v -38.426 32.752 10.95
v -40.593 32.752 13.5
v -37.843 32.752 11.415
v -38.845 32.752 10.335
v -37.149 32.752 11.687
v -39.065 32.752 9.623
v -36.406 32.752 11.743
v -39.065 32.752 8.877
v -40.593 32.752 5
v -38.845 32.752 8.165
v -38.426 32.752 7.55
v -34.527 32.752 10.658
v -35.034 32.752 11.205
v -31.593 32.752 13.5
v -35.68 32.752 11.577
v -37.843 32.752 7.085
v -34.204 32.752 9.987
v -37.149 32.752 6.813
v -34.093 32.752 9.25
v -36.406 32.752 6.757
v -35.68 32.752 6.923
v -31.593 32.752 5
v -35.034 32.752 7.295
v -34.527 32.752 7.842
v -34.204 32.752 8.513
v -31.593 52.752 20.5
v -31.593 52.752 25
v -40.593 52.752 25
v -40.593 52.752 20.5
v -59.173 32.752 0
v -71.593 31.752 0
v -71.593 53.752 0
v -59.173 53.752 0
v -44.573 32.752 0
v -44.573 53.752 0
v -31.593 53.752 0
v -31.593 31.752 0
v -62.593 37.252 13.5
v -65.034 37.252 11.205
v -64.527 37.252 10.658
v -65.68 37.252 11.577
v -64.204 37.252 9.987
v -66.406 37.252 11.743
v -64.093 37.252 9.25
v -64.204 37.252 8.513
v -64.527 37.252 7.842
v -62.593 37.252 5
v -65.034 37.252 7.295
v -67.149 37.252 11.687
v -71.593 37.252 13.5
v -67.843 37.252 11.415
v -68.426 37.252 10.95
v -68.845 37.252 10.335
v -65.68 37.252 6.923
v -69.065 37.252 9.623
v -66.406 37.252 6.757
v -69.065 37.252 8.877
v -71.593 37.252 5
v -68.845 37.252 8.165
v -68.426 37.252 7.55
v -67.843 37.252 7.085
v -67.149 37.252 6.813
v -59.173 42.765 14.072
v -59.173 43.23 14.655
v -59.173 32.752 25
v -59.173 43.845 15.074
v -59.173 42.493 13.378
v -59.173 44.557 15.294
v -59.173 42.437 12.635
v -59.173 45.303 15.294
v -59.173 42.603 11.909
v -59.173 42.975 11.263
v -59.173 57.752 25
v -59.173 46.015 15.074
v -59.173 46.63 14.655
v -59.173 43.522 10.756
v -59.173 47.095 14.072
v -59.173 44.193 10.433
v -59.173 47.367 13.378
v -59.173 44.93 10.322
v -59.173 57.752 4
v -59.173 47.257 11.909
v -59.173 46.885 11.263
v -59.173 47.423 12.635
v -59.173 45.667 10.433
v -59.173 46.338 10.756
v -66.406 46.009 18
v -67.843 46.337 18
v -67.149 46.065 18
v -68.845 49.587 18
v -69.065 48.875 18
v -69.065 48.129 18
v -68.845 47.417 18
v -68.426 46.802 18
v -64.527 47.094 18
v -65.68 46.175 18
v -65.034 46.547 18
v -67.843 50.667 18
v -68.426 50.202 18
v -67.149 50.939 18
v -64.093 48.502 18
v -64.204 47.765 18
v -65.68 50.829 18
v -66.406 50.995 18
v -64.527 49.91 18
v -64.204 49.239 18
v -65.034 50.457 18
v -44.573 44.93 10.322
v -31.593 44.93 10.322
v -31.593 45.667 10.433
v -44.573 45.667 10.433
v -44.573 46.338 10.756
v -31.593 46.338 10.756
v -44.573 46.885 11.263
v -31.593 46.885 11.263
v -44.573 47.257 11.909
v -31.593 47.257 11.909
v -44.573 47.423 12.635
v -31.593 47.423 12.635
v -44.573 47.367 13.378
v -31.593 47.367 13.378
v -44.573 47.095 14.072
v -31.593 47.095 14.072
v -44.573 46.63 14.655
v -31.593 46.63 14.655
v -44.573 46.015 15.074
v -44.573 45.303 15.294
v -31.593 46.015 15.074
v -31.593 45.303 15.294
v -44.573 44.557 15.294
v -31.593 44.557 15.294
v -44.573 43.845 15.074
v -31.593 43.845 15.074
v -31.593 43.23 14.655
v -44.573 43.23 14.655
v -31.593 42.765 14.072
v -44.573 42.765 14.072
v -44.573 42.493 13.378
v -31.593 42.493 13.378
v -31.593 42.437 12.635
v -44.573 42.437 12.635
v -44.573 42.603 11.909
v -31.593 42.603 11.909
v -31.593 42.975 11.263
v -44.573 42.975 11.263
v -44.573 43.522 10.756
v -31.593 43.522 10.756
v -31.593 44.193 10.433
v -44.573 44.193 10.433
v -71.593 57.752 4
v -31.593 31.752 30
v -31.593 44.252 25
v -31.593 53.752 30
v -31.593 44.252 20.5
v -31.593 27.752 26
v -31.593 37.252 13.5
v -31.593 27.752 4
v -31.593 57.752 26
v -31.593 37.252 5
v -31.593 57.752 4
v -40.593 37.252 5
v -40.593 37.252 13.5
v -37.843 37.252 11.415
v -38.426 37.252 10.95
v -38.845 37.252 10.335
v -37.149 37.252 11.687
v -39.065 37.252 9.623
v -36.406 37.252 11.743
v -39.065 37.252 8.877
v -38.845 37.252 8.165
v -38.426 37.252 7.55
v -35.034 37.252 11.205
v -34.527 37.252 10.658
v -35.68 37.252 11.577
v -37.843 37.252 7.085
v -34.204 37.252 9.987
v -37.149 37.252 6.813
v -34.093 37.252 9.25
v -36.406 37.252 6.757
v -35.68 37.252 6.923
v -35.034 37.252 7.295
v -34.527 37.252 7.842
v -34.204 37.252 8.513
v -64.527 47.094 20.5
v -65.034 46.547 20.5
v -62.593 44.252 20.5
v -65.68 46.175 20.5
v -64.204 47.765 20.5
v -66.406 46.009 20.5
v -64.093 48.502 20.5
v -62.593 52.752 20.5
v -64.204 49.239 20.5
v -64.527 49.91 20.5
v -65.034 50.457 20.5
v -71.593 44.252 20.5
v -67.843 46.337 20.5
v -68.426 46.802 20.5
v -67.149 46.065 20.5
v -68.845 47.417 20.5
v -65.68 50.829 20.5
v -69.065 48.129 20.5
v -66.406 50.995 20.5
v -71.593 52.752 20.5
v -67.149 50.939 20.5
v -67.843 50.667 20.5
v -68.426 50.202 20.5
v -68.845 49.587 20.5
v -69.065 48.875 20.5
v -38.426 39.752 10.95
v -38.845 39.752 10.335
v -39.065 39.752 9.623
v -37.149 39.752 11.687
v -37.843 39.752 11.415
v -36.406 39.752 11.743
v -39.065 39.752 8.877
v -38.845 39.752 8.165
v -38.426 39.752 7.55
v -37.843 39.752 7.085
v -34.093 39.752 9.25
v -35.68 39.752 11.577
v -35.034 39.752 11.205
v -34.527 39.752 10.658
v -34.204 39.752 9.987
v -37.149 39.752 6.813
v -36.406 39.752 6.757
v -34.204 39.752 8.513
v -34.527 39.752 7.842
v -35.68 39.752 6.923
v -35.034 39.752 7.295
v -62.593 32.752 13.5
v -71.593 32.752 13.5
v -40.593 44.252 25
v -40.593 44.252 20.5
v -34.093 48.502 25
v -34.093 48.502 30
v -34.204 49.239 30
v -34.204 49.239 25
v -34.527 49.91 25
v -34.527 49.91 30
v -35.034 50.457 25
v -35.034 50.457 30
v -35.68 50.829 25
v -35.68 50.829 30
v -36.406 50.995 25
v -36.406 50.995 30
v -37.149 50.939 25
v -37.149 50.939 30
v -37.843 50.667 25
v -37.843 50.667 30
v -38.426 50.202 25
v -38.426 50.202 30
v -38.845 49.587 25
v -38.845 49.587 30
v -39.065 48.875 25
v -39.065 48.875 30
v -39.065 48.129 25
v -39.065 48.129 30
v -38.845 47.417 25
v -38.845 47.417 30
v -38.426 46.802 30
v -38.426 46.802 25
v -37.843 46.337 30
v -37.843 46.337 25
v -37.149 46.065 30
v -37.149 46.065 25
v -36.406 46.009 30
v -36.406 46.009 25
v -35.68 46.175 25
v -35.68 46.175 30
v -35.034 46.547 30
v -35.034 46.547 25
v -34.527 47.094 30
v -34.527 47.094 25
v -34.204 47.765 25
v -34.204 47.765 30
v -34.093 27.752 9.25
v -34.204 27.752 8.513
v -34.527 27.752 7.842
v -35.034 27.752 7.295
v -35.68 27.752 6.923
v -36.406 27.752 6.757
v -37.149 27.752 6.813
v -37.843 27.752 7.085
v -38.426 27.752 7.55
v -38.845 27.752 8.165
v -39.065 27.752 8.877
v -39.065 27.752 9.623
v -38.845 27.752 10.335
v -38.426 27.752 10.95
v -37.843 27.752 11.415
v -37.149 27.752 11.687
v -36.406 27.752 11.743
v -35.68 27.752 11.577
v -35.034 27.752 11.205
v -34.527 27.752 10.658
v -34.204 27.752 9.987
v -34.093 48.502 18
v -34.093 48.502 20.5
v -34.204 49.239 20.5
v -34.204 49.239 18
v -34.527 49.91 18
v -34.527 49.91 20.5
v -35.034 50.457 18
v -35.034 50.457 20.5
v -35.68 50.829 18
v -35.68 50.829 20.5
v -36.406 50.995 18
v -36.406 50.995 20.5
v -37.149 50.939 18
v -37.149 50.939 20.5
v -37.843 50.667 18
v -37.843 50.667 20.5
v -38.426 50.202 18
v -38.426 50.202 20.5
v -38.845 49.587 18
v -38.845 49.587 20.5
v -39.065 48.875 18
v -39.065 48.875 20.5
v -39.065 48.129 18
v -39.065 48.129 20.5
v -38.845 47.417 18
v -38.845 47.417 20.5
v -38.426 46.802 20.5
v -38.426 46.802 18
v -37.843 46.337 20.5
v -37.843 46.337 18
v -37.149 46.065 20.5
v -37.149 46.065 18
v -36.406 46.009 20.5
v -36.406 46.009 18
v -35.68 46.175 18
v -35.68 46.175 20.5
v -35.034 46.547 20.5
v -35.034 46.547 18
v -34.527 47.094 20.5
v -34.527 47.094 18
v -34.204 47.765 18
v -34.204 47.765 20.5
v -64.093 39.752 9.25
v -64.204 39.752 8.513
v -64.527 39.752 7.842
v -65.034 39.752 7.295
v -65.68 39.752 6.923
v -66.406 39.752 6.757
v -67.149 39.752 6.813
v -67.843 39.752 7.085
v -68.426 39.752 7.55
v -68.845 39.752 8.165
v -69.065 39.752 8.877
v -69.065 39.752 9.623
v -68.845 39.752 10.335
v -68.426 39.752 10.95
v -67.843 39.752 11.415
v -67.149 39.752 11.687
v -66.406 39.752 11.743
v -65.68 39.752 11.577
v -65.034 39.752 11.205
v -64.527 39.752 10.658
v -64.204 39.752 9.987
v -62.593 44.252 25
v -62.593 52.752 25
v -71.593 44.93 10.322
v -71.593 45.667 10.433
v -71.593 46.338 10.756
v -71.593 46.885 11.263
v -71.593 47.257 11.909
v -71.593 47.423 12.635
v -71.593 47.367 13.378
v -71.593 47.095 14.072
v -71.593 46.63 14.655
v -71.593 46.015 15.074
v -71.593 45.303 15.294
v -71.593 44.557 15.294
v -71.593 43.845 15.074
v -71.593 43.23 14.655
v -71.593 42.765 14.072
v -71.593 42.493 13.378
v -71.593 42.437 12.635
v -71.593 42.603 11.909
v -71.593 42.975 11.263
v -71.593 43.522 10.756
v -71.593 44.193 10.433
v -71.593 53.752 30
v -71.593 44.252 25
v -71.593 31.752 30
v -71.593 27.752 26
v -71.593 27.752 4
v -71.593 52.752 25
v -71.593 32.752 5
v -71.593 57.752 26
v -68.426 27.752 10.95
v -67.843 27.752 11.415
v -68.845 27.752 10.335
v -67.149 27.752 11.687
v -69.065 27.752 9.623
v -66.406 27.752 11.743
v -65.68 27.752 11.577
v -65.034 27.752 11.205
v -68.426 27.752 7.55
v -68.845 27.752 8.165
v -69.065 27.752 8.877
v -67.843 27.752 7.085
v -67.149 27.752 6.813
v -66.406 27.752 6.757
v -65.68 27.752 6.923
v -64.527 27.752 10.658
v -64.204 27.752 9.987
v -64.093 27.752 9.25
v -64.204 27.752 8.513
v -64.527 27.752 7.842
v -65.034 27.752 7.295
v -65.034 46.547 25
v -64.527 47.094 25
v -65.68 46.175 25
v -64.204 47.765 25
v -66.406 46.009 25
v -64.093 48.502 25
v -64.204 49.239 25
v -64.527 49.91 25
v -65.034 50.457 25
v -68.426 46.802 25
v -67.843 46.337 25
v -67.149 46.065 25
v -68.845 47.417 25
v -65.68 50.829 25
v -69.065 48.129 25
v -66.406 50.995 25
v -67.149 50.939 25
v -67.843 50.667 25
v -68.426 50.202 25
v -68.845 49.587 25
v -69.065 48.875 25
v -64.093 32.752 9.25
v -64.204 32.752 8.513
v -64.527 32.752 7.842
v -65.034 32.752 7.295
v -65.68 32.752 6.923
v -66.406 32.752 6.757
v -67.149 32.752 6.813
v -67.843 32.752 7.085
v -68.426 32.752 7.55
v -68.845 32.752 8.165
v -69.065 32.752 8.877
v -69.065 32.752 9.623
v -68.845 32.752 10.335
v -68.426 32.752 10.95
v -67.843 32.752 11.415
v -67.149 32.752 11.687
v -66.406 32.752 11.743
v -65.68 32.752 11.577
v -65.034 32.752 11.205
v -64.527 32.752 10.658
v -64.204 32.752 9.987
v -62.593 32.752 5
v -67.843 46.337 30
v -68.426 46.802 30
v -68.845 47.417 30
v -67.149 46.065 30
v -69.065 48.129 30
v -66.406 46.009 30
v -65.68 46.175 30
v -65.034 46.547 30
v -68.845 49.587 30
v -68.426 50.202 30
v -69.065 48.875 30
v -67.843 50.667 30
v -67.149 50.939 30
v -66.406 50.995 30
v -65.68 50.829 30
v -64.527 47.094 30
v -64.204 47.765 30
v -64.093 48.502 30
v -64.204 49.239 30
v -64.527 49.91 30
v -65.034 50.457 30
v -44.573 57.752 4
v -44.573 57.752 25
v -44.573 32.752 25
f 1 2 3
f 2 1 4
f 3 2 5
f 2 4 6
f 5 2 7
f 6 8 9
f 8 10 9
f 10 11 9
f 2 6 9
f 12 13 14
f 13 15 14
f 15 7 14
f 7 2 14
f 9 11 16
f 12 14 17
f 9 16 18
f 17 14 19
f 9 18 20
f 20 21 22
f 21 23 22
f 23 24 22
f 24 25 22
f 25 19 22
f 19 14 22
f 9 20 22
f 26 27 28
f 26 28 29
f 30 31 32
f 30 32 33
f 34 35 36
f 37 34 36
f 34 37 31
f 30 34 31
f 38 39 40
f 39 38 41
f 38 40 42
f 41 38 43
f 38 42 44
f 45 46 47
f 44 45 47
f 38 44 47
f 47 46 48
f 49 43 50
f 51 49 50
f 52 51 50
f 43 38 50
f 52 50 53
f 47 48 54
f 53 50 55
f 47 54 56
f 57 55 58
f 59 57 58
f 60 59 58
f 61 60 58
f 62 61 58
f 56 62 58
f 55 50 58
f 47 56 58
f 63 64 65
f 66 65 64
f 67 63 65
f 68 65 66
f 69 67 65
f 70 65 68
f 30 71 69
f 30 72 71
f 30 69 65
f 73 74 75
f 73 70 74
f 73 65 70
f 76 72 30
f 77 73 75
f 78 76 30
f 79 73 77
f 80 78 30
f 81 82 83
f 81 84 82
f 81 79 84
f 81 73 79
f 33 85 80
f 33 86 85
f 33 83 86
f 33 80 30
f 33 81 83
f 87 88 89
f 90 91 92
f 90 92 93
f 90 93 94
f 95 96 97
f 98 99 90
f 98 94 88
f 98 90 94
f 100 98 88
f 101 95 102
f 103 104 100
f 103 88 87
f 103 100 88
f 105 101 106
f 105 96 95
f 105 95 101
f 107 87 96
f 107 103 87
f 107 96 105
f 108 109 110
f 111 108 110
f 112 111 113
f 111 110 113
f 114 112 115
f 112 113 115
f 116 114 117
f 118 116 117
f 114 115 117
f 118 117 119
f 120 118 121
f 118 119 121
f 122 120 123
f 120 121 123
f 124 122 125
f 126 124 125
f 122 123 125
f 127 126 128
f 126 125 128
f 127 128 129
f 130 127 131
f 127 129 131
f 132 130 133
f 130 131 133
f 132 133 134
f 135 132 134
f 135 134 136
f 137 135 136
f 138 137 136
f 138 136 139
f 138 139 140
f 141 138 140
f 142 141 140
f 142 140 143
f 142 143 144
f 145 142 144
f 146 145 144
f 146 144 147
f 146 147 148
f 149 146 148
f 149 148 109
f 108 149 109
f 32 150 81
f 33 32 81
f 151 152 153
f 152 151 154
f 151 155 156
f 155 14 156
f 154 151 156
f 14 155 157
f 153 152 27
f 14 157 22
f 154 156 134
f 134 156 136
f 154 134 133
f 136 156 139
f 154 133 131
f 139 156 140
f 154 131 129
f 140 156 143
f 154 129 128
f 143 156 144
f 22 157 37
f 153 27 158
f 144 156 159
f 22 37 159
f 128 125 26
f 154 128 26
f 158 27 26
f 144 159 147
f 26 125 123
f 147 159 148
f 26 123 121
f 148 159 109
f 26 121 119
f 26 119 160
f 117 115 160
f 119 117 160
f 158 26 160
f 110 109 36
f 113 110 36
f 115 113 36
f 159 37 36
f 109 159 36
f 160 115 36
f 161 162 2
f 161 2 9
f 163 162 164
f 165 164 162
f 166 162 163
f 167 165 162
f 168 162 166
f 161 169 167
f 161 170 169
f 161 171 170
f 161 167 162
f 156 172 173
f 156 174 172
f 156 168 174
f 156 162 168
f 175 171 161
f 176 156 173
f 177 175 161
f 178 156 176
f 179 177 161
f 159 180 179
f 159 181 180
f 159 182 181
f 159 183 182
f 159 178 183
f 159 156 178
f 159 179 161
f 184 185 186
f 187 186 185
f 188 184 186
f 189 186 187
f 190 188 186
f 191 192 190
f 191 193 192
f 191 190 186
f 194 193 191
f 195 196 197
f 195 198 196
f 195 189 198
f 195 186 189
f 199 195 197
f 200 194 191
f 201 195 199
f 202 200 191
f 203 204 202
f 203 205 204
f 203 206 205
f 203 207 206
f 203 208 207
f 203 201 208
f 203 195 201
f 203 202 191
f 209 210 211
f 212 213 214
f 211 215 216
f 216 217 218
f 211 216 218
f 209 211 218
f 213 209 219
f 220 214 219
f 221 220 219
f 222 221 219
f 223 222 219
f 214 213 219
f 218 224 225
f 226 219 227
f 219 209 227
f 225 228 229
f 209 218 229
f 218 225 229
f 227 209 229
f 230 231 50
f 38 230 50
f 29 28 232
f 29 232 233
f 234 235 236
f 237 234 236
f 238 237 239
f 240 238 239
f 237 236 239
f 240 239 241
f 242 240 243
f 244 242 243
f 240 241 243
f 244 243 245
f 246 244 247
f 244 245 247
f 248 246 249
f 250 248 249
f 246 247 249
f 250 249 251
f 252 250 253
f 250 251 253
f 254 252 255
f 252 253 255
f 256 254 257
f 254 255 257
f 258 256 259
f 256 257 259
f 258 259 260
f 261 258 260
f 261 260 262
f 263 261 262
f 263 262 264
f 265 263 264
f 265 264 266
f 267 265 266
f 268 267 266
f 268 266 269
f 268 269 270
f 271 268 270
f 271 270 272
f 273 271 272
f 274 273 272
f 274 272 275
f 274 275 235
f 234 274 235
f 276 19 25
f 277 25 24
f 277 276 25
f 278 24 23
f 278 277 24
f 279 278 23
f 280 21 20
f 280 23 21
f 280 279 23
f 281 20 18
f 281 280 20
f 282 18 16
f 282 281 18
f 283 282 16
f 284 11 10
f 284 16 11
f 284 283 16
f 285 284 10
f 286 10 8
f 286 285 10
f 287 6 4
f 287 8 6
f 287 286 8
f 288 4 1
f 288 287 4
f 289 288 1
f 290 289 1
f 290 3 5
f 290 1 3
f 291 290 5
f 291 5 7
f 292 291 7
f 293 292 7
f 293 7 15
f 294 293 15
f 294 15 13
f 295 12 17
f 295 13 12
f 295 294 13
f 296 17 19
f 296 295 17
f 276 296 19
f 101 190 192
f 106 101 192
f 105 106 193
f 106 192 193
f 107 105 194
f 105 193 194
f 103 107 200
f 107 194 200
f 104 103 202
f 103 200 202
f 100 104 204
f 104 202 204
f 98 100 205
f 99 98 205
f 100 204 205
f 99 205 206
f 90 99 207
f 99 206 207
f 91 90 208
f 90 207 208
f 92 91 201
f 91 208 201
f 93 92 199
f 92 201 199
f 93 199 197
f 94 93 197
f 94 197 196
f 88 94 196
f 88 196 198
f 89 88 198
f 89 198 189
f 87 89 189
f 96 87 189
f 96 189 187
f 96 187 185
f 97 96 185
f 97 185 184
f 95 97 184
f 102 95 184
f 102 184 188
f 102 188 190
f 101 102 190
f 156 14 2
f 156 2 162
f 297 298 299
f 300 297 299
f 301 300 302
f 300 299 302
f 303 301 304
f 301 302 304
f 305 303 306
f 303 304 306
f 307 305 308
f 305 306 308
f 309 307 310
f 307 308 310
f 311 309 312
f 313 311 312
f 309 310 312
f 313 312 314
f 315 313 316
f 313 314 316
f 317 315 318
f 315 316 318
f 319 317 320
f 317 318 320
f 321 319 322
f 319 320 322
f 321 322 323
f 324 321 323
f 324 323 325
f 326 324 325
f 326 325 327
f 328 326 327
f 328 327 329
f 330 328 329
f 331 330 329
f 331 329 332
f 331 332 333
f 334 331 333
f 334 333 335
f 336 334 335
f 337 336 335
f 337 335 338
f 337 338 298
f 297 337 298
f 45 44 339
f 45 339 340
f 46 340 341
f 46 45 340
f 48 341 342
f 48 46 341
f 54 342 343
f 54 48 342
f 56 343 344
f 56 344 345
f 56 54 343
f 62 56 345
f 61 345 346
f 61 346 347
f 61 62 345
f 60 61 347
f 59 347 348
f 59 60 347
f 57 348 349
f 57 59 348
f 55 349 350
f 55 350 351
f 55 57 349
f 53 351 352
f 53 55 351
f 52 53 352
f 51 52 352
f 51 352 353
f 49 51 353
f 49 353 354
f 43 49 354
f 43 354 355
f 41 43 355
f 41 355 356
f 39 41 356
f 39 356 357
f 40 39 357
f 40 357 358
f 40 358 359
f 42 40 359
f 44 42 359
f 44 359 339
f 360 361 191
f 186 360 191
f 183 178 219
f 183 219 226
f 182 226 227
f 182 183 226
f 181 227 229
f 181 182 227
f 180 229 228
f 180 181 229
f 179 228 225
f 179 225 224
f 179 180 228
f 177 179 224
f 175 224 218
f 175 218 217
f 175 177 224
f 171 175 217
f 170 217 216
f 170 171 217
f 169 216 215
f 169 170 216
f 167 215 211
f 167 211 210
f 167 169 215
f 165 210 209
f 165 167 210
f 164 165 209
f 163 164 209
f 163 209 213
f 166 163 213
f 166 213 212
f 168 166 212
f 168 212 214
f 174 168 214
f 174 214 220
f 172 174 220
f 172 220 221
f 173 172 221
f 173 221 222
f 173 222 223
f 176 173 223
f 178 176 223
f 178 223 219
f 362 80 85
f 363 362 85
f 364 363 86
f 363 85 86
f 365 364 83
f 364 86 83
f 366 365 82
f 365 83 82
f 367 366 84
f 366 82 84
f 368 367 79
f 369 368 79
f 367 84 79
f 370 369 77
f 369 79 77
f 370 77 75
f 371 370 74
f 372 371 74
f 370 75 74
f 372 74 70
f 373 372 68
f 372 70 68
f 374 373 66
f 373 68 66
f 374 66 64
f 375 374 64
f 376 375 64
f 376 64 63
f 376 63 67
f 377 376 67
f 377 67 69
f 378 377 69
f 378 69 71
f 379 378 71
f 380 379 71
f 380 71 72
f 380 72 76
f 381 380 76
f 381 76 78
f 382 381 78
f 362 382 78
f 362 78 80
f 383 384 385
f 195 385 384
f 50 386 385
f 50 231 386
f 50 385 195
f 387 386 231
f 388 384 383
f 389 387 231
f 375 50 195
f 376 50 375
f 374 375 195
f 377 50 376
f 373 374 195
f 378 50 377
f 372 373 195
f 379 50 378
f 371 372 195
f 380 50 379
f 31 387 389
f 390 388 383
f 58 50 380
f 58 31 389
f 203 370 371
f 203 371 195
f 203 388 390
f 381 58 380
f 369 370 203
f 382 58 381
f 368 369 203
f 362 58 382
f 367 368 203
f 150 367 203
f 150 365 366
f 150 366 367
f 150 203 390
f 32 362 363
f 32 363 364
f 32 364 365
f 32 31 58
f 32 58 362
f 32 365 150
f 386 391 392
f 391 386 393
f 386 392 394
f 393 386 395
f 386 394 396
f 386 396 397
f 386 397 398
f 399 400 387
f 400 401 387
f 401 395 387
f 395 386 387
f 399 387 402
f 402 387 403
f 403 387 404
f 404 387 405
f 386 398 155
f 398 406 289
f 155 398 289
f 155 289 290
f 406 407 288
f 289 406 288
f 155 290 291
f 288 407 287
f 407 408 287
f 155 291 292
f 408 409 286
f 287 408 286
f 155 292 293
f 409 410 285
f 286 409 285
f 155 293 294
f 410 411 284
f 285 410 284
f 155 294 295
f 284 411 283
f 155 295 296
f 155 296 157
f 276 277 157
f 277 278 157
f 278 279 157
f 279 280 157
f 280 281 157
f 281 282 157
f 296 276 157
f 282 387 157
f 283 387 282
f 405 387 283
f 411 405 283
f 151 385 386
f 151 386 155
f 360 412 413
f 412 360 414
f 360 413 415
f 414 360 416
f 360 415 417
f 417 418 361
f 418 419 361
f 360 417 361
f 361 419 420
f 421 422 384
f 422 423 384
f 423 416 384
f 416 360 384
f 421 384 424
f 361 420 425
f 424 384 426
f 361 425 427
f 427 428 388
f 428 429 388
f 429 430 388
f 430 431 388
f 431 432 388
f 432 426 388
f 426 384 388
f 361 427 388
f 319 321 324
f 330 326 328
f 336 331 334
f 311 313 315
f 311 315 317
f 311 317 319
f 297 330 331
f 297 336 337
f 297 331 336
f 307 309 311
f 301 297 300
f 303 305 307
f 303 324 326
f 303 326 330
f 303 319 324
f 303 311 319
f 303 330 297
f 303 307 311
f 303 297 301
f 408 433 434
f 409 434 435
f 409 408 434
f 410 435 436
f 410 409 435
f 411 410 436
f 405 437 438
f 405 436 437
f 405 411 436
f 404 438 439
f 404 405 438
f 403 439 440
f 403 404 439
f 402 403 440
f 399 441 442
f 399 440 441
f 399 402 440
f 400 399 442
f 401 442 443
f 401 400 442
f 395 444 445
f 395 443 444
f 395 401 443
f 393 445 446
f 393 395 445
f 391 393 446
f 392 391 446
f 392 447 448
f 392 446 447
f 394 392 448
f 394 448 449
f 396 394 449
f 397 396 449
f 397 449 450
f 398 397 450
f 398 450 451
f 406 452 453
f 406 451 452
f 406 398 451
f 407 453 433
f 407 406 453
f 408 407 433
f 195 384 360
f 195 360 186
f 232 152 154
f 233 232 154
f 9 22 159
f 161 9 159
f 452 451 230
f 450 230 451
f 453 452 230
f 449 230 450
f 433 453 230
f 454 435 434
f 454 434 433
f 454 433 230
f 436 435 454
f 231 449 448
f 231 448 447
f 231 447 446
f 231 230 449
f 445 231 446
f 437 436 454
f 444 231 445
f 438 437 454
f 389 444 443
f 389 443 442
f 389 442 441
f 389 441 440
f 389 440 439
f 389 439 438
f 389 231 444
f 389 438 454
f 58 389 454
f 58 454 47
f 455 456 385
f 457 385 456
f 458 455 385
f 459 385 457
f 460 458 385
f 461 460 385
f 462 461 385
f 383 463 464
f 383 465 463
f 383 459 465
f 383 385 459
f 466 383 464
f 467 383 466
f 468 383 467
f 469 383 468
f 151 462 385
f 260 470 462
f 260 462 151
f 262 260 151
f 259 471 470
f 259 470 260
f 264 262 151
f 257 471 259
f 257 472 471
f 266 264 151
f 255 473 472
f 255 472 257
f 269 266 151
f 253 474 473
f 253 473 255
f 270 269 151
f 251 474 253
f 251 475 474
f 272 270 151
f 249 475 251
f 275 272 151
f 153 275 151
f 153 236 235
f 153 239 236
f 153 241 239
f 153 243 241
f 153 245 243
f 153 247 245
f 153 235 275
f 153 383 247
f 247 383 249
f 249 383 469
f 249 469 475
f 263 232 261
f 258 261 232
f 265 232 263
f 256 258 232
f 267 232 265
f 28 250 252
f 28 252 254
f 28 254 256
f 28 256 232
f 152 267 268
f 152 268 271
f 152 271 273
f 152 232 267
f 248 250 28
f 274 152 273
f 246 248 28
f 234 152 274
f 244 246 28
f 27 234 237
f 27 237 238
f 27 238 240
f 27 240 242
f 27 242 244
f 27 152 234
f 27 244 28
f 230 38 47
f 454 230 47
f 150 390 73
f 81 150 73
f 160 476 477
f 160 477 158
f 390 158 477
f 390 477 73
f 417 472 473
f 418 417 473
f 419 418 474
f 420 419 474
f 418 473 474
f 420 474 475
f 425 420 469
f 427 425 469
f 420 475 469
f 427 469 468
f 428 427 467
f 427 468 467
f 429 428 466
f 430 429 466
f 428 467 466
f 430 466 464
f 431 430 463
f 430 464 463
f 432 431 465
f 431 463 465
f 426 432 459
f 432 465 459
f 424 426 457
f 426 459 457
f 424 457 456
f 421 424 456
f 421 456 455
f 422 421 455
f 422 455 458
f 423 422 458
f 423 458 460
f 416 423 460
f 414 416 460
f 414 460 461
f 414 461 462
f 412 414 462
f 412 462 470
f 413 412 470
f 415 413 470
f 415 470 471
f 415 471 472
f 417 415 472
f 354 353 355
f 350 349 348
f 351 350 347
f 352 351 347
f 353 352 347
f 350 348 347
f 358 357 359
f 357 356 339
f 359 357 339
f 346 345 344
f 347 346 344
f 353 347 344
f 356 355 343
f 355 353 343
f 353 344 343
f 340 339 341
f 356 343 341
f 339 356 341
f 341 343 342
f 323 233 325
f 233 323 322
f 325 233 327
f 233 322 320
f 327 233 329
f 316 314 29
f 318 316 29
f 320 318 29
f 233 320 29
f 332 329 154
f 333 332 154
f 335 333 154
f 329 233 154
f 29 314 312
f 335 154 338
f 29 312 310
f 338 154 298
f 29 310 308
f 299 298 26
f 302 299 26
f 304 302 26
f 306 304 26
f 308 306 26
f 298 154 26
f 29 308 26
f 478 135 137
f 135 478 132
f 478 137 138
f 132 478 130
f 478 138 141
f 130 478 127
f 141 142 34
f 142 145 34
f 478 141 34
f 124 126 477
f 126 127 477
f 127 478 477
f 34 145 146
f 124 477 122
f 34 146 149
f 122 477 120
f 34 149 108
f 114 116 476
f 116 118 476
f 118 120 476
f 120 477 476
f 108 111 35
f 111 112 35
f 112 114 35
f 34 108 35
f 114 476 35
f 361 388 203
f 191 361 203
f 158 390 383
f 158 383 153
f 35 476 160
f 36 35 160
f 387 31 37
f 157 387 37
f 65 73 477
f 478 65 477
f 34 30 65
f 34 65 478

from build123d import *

# Parameters (mm, degrees)
SKETCH1_W           = 39.999999999
SKETCH1_H           = 30
BOSS_EXTRUDE1_DEPTH = 30
SKETCH2_W           = 14.6
SKETCH2_H           = 33.728920846
CUT_EXTRUDE1_DEPTH  = 25
SKETCH3_R           = 2.5
CUT_EXTRUDE2_DEPTH  = 77.38910698
SKETCH4_W           = 8.5
SKETCH4_H           = 4.5
SKETCH4_W_2         = 4.5
SKETCH4_H_2         = 8.5
CUT_EXTRUDE3_DEPTH  = 9
CUT_EXTRUDE4_START  = -40
SKETCH4_2_W         = 8.5
SKETCH4_2_H         = 4.5
SKETCH4_2_W_2       = 4.5
SKETCH4_2_H_2       = 8.5
CUT_EXTRUDE4_DEPTH  = 9
SKETCH5_R           = 2.5
CUT_EXTRUDE5_DEPTH  = 12
CHAMFER1_SIZE       = 4


with BuildPart() as part:
    # Sketch1 → Boss-Extrude1 (new body)
    with BuildSketch(Plane.XY):
        with Locations((-51.592932584, 42.752018711)):
            Rectangle(SKETCH1_W, SKETCH1_H)
    extrude(amount=BOSS_EXTRUDE1_DEPTH)

    # Sketch2 → Cut-Extrude1 (cut)
    with BuildSketch(Plane(origin=(0, 57.752018711, 0), x_dir=(1, 0, 0), z_dir=(0, 1, 0))):
        with Locations((-51.872932582, -8.135539577)):
            Rectangle(SKETCH2_W, SKETCH2_H)
    extrude(amount=-CUT_EXTRUDE1_DEPTH, mode=Mode.SUBTRACT)

    # Sketch3 → Cut-Extrude2 (cut, through all)
    with BuildSketch(Plane(origin=(-31.592932584, 0, 0), x_dir=(0, 0, -1), z_dir=(1, 0, 0))):
        with Locations((-12.822072937, 44.929945774)):
            Circle(SKETCH3_R)
    extrude(amount=-CUT_EXTRUDE2_DEPTH, mode=Mode.SUBTRACT)

    # Sketch4 → Cut-Extrude3 (cut)
    with BuildSketch(Plane(origin=(-31.592932584, 0, 0), x_dir=(0, 0, -1), z_dir=(1, 0, 0))):
        with Locations((-9.25, 35.002018711)):
            Rectangle(SKETCH4_W, SKETCH4_H)
        with Locations((-22.75, 48.502018711)):
            Rectangle(SKETCH4_W_2, SKETCH4_H_2)
    extrude(amount=-CUT_EXTRUDE3_DEPTH, mode=Mode.SUBTRACT)

    # Sketch4<2> → Cut-Extrude4 (cut)
    with BuildSketch(Plane(origin=(-31.592932584, 0, 0), x_dir=(0, 0, -1), z_dir=(1, 0, 0)).offset(CUT_EXTRUDE4_START)):
        with Locations((-9.25, 35.002018711)):
            Rectangle(SKETCH4_2_W, SKETCH4_2_H)
        with Locations((-22.75, 48.502018711)):
            Rectangle(SKETCH4_2_W_2, SKETCH4_2_H_2)
    extrude(amount=CUT_EXTRUDE4_DEPTH, mode=Mode.SUBTRACT)

    # Sketch5 → Cut-Extrude5 (cut)
    with BuildSketch(Plane.XY.offset(30)):
        with Locations((-66.592932583, 48.502018711)):
            Circle(SKETCH5_R)
        with Locations((-36.592932584, 48.502018711)):
            Circle(SKETCH5_R)
    cut_extrude5 = extrude(amount=-CUT_EXTRUDE5_DEPTH, mode=Mode.SUBTRACT)

    # Mirror1: Cut-Extrude5 across plane
    add(cut_extrude5.mirror(Plane(origin=(0, 28.876009355, 28.876009355), x_dir=(0, -0.7071067811865478, 0.7071067811865472), z_dir=(0, -0.7071067811865475, -0.7071067811865477))), mode=Mode.SUBTRACT)

    # Chamfer1
    chamfer1_edges = [part.edges().sort_by_distance(p)[0] for p in [
        (-51.592932584, 27.752018711, 30),
        (-65.382932583, 57.752018711, 0),
        (-51.592932584, 27.752018711, 0),
        (-38.082932583, 57.752018711, 0),
        (-51.592932584, 57.752018711, 30),
    ]]
    chamfer(chamfer1_edges, length=CHAMFER1_SIZE)


solid = part.part
